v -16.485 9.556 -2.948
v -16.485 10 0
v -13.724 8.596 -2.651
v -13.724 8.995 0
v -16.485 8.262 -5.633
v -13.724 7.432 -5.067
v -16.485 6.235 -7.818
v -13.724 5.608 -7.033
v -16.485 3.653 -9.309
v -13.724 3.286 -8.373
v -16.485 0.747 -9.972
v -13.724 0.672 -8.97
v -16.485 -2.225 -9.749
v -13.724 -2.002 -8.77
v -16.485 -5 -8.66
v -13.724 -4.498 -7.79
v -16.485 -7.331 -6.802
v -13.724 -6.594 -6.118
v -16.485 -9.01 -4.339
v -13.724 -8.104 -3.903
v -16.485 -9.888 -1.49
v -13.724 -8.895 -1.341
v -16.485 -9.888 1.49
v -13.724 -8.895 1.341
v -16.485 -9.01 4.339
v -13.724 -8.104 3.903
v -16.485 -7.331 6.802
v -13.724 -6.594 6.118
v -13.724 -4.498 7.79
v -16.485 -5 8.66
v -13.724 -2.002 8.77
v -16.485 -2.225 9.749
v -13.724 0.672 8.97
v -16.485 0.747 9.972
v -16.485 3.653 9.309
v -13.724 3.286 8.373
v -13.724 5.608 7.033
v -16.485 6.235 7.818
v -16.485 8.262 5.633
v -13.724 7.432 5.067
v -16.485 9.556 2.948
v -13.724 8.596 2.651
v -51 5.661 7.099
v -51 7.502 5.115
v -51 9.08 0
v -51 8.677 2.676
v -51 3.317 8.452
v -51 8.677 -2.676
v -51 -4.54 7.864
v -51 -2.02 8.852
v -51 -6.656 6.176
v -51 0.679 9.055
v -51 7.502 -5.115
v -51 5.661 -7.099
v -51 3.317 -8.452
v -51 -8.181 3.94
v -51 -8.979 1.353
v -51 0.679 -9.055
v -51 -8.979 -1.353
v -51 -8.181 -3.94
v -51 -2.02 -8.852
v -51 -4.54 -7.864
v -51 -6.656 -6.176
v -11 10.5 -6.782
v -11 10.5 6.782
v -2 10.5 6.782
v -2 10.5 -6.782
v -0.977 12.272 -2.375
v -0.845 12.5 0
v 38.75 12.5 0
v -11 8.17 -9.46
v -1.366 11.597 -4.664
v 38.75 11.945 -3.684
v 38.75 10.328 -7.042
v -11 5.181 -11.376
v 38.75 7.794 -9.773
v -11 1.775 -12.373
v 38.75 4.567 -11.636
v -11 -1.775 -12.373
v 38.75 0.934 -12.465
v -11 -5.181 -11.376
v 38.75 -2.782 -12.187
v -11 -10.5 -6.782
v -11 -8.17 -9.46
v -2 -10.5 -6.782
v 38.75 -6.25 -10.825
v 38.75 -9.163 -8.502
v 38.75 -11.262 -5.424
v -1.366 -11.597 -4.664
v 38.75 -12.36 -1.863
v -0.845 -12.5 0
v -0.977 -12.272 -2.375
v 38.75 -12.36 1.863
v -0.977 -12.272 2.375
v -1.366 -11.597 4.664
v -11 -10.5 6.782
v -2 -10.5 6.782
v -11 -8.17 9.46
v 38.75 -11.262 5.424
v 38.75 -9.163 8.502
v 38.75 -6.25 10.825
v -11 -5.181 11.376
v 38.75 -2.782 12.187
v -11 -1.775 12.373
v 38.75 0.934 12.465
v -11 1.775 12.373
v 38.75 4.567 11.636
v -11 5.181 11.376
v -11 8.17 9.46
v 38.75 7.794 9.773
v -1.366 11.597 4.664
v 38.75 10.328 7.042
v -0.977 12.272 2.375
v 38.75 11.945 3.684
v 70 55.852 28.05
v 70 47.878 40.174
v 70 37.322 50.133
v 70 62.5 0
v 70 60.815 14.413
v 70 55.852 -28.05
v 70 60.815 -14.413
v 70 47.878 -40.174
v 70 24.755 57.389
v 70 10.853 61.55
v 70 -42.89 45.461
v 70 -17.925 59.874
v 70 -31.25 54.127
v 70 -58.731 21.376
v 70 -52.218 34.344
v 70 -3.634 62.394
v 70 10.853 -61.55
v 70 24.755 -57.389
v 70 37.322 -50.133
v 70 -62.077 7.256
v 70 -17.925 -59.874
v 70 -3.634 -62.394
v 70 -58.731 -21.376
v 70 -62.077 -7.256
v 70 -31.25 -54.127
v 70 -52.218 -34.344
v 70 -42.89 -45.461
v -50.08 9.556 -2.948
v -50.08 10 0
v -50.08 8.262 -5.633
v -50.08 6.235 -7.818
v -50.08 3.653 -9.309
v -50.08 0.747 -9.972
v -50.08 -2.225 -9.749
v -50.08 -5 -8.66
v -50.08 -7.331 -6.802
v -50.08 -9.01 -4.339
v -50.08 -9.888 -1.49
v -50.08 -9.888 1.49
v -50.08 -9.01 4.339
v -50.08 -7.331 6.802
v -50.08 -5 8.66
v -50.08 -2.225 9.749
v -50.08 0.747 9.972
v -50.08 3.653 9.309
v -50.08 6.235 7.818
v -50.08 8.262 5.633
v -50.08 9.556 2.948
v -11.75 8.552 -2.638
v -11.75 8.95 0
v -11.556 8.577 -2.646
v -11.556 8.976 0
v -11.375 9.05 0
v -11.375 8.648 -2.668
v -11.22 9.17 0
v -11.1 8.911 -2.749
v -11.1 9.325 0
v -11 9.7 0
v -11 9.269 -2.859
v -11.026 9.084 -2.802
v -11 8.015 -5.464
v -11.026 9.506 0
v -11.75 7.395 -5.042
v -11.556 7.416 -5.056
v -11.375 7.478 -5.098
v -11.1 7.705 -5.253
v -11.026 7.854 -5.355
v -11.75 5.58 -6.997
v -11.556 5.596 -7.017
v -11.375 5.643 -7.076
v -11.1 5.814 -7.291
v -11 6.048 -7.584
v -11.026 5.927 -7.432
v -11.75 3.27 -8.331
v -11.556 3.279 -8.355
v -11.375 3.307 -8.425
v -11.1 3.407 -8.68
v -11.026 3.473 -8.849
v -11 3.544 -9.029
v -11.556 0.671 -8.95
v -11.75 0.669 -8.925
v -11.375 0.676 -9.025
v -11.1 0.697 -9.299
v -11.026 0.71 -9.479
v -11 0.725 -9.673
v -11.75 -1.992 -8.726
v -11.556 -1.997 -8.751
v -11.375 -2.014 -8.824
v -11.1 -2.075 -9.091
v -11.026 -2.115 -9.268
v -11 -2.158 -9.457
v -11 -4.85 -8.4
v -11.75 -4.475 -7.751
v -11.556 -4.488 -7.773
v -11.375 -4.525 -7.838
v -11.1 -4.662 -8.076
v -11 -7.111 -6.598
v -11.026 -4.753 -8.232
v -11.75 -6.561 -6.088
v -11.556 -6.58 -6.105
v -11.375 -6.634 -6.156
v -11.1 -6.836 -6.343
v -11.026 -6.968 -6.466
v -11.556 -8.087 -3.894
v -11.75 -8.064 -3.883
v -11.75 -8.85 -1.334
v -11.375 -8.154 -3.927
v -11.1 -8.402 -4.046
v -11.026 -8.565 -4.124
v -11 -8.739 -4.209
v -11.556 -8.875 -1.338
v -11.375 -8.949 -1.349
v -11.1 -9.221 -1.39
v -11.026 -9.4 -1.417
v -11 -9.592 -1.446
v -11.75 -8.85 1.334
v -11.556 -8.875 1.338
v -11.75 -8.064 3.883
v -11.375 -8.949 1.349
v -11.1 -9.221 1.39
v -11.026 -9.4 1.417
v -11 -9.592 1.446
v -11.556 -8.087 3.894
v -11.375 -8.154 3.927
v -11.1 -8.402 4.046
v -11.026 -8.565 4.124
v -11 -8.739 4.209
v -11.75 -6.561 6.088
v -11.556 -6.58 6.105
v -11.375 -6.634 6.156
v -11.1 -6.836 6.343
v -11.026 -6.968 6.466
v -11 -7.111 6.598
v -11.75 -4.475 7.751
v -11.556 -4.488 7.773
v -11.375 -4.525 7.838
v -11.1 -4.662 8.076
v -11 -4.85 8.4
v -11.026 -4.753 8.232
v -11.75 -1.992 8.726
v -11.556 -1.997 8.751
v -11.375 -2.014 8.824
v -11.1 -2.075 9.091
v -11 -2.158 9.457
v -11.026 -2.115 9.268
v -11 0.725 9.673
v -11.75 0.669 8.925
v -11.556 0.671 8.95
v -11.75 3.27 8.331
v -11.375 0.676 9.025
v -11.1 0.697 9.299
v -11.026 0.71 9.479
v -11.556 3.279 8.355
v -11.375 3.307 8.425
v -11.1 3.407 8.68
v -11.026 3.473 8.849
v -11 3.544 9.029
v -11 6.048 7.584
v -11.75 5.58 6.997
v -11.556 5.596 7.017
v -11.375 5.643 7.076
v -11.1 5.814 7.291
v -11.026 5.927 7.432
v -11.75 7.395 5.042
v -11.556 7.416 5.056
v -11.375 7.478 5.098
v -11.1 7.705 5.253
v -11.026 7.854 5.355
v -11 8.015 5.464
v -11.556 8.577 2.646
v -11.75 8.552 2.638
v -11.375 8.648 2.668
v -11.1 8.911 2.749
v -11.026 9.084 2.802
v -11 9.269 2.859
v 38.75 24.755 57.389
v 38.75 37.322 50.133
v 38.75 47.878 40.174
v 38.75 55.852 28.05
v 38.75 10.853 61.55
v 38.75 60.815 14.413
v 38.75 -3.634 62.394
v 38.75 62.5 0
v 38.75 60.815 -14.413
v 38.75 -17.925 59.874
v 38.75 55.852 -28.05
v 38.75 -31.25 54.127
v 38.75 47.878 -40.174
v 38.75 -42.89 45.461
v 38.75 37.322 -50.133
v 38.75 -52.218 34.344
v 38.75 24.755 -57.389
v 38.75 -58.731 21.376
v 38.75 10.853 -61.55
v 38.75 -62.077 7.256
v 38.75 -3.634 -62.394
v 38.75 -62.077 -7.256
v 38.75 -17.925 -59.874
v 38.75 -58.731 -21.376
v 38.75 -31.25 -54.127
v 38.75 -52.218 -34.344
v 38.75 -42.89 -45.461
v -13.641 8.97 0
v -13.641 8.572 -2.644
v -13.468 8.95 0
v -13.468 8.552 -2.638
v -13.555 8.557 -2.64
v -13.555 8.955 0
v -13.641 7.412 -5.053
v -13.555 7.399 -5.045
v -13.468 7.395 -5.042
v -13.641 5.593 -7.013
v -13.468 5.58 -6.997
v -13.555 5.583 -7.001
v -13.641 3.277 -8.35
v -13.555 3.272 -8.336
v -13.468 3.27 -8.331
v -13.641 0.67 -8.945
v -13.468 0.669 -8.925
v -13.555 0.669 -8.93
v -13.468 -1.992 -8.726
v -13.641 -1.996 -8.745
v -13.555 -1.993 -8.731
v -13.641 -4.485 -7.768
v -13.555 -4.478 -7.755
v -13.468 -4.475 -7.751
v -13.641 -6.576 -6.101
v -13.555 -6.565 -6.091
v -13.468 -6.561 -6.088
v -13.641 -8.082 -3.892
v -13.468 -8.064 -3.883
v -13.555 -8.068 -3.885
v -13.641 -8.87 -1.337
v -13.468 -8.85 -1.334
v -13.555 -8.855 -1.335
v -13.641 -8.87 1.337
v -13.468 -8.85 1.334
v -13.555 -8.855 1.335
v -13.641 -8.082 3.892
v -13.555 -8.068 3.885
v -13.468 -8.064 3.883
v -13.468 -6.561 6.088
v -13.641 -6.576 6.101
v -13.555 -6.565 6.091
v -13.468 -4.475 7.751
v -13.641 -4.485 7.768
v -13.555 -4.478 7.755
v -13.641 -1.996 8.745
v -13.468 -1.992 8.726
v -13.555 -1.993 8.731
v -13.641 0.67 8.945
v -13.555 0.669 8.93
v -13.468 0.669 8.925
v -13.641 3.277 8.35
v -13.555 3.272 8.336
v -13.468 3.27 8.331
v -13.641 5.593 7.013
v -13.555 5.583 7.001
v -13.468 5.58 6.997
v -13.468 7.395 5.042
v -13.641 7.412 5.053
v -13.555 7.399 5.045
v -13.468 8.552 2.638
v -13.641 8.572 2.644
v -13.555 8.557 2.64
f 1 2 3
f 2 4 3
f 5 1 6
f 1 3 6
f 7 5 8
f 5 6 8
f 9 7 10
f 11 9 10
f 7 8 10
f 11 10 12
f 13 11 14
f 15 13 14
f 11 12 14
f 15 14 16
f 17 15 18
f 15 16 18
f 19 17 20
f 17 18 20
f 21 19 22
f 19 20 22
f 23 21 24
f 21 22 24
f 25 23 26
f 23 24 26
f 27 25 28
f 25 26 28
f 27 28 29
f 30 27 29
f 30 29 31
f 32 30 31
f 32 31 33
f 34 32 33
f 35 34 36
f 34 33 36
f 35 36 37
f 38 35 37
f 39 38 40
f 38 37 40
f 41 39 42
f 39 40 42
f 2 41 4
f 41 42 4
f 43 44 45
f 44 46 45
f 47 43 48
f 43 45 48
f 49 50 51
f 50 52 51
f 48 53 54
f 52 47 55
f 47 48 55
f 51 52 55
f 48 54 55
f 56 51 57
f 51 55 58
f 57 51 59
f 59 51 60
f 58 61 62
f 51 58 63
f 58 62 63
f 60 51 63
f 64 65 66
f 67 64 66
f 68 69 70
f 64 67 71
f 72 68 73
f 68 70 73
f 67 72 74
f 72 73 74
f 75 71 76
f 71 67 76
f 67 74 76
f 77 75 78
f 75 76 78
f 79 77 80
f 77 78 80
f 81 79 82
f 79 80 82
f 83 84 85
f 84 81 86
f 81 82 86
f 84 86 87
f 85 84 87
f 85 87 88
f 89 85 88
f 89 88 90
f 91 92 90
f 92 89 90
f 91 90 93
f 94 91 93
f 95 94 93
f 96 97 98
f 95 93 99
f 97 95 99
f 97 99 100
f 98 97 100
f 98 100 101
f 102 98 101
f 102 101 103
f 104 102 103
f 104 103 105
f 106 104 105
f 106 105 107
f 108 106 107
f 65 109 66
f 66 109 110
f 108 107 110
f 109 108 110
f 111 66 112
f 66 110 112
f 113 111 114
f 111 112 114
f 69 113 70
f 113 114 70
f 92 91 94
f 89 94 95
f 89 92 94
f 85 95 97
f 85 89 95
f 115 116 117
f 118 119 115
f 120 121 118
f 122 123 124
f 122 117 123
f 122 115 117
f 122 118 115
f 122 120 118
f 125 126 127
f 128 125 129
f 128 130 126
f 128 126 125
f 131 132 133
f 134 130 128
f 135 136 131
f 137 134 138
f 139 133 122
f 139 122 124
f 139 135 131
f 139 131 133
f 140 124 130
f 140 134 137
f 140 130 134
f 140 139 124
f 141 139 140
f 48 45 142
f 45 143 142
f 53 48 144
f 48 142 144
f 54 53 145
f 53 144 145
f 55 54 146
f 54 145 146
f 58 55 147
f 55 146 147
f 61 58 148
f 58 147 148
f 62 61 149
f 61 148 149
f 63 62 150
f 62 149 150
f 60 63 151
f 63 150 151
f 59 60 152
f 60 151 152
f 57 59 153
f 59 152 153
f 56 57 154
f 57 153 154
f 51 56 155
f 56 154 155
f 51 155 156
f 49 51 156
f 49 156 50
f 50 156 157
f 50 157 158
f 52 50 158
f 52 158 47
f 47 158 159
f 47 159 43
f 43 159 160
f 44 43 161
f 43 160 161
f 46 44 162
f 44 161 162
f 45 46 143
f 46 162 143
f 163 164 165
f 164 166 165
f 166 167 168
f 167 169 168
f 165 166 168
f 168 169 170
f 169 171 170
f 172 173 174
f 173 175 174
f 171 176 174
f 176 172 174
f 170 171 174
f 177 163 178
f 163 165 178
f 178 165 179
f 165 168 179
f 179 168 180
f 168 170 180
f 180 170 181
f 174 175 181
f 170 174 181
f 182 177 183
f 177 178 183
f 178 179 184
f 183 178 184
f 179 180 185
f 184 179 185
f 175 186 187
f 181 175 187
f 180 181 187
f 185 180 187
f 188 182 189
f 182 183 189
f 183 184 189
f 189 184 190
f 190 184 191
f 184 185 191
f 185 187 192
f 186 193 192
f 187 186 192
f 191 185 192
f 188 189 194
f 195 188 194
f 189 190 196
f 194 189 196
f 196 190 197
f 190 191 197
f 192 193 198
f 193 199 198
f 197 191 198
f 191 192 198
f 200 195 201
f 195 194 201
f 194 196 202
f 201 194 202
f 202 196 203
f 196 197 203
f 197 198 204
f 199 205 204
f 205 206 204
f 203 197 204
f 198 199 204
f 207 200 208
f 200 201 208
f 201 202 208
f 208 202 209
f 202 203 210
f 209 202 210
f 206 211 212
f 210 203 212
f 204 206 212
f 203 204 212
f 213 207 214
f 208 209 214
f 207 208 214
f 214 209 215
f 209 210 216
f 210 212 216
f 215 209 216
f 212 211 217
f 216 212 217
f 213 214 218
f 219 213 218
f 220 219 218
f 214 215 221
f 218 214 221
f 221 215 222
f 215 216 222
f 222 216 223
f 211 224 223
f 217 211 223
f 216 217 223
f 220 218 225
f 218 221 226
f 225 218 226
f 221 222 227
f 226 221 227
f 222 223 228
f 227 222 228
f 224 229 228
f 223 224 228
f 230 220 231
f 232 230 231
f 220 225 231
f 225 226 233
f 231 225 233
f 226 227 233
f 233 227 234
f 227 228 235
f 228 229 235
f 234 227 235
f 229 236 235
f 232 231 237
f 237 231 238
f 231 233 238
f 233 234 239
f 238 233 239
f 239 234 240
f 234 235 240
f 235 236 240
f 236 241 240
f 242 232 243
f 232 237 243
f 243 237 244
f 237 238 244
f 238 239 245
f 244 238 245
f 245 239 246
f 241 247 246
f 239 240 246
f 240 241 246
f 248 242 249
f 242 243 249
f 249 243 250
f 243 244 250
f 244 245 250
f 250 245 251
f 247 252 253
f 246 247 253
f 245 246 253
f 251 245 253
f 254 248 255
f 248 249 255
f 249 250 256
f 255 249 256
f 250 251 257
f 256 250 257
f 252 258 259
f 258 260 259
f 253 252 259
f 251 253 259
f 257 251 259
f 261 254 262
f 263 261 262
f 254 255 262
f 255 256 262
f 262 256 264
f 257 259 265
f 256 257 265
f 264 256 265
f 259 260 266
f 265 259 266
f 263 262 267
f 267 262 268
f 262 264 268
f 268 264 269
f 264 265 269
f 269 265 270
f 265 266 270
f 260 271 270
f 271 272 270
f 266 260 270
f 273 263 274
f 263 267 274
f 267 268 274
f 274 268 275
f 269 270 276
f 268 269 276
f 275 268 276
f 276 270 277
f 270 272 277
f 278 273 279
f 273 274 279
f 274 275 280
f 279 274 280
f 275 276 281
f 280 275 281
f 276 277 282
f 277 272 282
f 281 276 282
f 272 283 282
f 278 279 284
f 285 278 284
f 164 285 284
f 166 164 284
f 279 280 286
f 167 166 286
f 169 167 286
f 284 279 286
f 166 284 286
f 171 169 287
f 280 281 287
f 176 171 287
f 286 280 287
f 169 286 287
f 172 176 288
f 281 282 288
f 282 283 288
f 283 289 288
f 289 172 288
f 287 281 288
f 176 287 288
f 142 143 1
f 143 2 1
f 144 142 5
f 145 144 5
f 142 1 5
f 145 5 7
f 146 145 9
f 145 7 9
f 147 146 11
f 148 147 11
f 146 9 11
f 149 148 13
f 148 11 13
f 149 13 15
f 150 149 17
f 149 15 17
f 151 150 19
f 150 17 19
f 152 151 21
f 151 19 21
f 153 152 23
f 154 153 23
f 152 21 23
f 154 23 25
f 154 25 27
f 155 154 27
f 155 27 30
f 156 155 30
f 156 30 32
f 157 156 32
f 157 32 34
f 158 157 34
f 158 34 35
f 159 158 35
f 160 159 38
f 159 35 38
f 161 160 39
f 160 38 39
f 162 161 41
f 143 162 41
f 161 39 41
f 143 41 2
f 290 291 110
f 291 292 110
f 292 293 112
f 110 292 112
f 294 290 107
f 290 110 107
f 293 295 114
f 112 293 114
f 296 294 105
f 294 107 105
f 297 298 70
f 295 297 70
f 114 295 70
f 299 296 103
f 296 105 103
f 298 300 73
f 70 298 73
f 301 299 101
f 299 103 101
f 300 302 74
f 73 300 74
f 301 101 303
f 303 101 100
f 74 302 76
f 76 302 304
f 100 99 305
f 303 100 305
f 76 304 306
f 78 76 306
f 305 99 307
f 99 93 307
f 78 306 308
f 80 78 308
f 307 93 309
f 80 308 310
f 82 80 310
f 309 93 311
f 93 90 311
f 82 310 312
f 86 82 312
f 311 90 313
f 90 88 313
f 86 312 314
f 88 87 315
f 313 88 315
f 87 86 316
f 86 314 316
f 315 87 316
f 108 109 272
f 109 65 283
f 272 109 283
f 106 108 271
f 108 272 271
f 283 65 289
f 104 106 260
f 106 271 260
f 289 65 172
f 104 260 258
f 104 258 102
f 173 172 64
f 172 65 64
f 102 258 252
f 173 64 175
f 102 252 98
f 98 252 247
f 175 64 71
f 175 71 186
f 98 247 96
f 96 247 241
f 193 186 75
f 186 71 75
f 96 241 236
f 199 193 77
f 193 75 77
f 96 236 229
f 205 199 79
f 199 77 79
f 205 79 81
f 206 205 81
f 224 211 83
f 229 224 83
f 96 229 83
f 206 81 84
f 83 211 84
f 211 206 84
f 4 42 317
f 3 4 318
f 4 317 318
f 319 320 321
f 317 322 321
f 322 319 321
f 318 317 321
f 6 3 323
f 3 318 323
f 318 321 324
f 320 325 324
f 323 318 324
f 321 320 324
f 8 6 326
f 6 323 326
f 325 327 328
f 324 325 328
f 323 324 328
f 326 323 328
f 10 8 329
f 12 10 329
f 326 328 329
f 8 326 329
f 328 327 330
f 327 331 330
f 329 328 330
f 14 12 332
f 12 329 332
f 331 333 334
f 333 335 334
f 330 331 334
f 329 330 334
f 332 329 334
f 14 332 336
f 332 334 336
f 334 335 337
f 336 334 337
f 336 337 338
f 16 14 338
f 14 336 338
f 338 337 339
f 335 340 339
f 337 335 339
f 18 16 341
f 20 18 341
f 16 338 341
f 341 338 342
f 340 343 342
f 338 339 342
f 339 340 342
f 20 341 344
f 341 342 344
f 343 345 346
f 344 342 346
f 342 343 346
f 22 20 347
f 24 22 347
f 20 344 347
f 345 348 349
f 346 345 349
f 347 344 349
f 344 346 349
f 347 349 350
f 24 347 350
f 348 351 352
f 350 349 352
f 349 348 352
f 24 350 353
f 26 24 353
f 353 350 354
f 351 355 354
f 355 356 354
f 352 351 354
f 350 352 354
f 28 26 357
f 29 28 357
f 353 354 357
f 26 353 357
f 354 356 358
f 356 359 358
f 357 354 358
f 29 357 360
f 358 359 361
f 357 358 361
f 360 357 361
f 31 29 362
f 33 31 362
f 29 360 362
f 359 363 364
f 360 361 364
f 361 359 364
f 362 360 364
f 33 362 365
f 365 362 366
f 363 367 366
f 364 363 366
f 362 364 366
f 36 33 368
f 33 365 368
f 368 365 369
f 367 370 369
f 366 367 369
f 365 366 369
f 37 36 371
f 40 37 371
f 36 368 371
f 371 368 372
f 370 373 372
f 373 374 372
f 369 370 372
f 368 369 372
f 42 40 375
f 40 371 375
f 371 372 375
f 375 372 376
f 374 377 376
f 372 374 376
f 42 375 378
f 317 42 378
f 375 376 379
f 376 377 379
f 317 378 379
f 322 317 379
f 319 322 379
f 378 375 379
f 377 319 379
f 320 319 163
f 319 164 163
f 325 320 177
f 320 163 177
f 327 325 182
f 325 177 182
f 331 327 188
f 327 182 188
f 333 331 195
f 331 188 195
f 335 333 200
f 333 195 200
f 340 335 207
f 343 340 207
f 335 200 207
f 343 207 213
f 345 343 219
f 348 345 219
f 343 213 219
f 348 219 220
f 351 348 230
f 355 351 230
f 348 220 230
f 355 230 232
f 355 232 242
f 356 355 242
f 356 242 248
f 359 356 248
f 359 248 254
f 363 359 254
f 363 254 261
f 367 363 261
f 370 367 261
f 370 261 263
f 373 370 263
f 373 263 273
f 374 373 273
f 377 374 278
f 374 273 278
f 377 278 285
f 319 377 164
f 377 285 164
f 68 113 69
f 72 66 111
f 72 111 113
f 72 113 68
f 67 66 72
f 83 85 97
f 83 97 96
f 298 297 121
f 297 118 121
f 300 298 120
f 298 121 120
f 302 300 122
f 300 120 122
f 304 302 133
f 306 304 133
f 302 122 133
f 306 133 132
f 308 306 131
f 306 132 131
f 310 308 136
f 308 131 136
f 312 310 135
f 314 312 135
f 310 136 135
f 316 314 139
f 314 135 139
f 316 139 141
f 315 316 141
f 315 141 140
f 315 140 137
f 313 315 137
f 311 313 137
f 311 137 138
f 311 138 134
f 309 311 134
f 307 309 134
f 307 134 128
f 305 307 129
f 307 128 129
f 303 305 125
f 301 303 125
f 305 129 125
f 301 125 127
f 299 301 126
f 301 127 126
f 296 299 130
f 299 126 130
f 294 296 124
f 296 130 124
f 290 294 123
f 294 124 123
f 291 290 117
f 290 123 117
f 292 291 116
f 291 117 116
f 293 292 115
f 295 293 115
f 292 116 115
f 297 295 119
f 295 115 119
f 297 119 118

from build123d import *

# Parameters (mm, degrees)
SKETCH1_W               = 81
SKETCH1_H               = 12.5
SKETCH2_W               = 31.25
SKETCH2_H               = 62.5
CUT_EXTRUDE1_DEPTH      = 25
CUT_EXTRUDE1_DEPTH_BACK = 25


with BuildPart() as part:
    # Sketch1 → Revolve1 (revolve)
    with BuildSketch(Plane.XY):
        with Locations((29.5, 6.25)):
            Rectangle(SKETCH1_W, SKETCH1_H)
    revolve(axis=Axis((70, 0, 0), (-1, 0, 0)))

    # Sketch2 → Revolve2 (revolve)
    with BuildSketch(Plane.XY):
        with Locations((54.375, 31.25)):
            Rectangle(SKETCH2_W, SKETCH2_H)
    revolve(axis=Axis((70, 0, 0), (-1, 0, 0)))

    # Sketch3 → Revolve3 (revolve)
    with BuildSketch(Plane.XY):
        with BuildLine():
            Line((-51, 0), (-51, 9.08))
            Line((-51, 9.08), (-50.08, 10))
            Line((-50.08, 10), (-16.48485129, 10))
            Line((-16.48485129, 10), (-13.724269872, 8.995230534))
            ThreePointArc((-13.724269872, 8.995230534), (-13.597990898, 8.961394185), (-13.467754764, 8.95))
            Line((-13.467754764, 8.95), (-11.75, 8.95))
            ThreePointArc((-11.75, 8.95), (-11.219669914, 9.169669914), (-11, 9.7))
            Line((-11, 9.7), (-11, 10))
            Line((-11, 10), (-10, 10))
            Line((-10, 10), (-10, 0))
            Line((-10, 0), (-51, 0))
        make_face()
    revolve(axis=Axis((-10, 0, 0), (-1, 0, 0)))

    # Sketch4 → Cut-Extrude1 (cut, two sides: drawn at the far end of the back side and taken through both)
    with BuildSketch(Plane.XY.offset(-CUT_EXTRUDE1_DEPTH_BACK)):
        Polygon((-67, -28), (8.103629711, -28), (-2, -10.5), (-11, -10.5), (-11, -15.5), (-56, -15.5), (-56, 15.5), (-11, 15.5), (-11, 10.5), (-2, 10.5), (8.103629711, 28), (-67, 28), align=None)
    extrude(amount=CUT_EXTRUDE1_DEPTH + CUT_EXTRUDE1_DEPTH_BACK, mode=Mode.SUBTRACT)


solid = part.part
